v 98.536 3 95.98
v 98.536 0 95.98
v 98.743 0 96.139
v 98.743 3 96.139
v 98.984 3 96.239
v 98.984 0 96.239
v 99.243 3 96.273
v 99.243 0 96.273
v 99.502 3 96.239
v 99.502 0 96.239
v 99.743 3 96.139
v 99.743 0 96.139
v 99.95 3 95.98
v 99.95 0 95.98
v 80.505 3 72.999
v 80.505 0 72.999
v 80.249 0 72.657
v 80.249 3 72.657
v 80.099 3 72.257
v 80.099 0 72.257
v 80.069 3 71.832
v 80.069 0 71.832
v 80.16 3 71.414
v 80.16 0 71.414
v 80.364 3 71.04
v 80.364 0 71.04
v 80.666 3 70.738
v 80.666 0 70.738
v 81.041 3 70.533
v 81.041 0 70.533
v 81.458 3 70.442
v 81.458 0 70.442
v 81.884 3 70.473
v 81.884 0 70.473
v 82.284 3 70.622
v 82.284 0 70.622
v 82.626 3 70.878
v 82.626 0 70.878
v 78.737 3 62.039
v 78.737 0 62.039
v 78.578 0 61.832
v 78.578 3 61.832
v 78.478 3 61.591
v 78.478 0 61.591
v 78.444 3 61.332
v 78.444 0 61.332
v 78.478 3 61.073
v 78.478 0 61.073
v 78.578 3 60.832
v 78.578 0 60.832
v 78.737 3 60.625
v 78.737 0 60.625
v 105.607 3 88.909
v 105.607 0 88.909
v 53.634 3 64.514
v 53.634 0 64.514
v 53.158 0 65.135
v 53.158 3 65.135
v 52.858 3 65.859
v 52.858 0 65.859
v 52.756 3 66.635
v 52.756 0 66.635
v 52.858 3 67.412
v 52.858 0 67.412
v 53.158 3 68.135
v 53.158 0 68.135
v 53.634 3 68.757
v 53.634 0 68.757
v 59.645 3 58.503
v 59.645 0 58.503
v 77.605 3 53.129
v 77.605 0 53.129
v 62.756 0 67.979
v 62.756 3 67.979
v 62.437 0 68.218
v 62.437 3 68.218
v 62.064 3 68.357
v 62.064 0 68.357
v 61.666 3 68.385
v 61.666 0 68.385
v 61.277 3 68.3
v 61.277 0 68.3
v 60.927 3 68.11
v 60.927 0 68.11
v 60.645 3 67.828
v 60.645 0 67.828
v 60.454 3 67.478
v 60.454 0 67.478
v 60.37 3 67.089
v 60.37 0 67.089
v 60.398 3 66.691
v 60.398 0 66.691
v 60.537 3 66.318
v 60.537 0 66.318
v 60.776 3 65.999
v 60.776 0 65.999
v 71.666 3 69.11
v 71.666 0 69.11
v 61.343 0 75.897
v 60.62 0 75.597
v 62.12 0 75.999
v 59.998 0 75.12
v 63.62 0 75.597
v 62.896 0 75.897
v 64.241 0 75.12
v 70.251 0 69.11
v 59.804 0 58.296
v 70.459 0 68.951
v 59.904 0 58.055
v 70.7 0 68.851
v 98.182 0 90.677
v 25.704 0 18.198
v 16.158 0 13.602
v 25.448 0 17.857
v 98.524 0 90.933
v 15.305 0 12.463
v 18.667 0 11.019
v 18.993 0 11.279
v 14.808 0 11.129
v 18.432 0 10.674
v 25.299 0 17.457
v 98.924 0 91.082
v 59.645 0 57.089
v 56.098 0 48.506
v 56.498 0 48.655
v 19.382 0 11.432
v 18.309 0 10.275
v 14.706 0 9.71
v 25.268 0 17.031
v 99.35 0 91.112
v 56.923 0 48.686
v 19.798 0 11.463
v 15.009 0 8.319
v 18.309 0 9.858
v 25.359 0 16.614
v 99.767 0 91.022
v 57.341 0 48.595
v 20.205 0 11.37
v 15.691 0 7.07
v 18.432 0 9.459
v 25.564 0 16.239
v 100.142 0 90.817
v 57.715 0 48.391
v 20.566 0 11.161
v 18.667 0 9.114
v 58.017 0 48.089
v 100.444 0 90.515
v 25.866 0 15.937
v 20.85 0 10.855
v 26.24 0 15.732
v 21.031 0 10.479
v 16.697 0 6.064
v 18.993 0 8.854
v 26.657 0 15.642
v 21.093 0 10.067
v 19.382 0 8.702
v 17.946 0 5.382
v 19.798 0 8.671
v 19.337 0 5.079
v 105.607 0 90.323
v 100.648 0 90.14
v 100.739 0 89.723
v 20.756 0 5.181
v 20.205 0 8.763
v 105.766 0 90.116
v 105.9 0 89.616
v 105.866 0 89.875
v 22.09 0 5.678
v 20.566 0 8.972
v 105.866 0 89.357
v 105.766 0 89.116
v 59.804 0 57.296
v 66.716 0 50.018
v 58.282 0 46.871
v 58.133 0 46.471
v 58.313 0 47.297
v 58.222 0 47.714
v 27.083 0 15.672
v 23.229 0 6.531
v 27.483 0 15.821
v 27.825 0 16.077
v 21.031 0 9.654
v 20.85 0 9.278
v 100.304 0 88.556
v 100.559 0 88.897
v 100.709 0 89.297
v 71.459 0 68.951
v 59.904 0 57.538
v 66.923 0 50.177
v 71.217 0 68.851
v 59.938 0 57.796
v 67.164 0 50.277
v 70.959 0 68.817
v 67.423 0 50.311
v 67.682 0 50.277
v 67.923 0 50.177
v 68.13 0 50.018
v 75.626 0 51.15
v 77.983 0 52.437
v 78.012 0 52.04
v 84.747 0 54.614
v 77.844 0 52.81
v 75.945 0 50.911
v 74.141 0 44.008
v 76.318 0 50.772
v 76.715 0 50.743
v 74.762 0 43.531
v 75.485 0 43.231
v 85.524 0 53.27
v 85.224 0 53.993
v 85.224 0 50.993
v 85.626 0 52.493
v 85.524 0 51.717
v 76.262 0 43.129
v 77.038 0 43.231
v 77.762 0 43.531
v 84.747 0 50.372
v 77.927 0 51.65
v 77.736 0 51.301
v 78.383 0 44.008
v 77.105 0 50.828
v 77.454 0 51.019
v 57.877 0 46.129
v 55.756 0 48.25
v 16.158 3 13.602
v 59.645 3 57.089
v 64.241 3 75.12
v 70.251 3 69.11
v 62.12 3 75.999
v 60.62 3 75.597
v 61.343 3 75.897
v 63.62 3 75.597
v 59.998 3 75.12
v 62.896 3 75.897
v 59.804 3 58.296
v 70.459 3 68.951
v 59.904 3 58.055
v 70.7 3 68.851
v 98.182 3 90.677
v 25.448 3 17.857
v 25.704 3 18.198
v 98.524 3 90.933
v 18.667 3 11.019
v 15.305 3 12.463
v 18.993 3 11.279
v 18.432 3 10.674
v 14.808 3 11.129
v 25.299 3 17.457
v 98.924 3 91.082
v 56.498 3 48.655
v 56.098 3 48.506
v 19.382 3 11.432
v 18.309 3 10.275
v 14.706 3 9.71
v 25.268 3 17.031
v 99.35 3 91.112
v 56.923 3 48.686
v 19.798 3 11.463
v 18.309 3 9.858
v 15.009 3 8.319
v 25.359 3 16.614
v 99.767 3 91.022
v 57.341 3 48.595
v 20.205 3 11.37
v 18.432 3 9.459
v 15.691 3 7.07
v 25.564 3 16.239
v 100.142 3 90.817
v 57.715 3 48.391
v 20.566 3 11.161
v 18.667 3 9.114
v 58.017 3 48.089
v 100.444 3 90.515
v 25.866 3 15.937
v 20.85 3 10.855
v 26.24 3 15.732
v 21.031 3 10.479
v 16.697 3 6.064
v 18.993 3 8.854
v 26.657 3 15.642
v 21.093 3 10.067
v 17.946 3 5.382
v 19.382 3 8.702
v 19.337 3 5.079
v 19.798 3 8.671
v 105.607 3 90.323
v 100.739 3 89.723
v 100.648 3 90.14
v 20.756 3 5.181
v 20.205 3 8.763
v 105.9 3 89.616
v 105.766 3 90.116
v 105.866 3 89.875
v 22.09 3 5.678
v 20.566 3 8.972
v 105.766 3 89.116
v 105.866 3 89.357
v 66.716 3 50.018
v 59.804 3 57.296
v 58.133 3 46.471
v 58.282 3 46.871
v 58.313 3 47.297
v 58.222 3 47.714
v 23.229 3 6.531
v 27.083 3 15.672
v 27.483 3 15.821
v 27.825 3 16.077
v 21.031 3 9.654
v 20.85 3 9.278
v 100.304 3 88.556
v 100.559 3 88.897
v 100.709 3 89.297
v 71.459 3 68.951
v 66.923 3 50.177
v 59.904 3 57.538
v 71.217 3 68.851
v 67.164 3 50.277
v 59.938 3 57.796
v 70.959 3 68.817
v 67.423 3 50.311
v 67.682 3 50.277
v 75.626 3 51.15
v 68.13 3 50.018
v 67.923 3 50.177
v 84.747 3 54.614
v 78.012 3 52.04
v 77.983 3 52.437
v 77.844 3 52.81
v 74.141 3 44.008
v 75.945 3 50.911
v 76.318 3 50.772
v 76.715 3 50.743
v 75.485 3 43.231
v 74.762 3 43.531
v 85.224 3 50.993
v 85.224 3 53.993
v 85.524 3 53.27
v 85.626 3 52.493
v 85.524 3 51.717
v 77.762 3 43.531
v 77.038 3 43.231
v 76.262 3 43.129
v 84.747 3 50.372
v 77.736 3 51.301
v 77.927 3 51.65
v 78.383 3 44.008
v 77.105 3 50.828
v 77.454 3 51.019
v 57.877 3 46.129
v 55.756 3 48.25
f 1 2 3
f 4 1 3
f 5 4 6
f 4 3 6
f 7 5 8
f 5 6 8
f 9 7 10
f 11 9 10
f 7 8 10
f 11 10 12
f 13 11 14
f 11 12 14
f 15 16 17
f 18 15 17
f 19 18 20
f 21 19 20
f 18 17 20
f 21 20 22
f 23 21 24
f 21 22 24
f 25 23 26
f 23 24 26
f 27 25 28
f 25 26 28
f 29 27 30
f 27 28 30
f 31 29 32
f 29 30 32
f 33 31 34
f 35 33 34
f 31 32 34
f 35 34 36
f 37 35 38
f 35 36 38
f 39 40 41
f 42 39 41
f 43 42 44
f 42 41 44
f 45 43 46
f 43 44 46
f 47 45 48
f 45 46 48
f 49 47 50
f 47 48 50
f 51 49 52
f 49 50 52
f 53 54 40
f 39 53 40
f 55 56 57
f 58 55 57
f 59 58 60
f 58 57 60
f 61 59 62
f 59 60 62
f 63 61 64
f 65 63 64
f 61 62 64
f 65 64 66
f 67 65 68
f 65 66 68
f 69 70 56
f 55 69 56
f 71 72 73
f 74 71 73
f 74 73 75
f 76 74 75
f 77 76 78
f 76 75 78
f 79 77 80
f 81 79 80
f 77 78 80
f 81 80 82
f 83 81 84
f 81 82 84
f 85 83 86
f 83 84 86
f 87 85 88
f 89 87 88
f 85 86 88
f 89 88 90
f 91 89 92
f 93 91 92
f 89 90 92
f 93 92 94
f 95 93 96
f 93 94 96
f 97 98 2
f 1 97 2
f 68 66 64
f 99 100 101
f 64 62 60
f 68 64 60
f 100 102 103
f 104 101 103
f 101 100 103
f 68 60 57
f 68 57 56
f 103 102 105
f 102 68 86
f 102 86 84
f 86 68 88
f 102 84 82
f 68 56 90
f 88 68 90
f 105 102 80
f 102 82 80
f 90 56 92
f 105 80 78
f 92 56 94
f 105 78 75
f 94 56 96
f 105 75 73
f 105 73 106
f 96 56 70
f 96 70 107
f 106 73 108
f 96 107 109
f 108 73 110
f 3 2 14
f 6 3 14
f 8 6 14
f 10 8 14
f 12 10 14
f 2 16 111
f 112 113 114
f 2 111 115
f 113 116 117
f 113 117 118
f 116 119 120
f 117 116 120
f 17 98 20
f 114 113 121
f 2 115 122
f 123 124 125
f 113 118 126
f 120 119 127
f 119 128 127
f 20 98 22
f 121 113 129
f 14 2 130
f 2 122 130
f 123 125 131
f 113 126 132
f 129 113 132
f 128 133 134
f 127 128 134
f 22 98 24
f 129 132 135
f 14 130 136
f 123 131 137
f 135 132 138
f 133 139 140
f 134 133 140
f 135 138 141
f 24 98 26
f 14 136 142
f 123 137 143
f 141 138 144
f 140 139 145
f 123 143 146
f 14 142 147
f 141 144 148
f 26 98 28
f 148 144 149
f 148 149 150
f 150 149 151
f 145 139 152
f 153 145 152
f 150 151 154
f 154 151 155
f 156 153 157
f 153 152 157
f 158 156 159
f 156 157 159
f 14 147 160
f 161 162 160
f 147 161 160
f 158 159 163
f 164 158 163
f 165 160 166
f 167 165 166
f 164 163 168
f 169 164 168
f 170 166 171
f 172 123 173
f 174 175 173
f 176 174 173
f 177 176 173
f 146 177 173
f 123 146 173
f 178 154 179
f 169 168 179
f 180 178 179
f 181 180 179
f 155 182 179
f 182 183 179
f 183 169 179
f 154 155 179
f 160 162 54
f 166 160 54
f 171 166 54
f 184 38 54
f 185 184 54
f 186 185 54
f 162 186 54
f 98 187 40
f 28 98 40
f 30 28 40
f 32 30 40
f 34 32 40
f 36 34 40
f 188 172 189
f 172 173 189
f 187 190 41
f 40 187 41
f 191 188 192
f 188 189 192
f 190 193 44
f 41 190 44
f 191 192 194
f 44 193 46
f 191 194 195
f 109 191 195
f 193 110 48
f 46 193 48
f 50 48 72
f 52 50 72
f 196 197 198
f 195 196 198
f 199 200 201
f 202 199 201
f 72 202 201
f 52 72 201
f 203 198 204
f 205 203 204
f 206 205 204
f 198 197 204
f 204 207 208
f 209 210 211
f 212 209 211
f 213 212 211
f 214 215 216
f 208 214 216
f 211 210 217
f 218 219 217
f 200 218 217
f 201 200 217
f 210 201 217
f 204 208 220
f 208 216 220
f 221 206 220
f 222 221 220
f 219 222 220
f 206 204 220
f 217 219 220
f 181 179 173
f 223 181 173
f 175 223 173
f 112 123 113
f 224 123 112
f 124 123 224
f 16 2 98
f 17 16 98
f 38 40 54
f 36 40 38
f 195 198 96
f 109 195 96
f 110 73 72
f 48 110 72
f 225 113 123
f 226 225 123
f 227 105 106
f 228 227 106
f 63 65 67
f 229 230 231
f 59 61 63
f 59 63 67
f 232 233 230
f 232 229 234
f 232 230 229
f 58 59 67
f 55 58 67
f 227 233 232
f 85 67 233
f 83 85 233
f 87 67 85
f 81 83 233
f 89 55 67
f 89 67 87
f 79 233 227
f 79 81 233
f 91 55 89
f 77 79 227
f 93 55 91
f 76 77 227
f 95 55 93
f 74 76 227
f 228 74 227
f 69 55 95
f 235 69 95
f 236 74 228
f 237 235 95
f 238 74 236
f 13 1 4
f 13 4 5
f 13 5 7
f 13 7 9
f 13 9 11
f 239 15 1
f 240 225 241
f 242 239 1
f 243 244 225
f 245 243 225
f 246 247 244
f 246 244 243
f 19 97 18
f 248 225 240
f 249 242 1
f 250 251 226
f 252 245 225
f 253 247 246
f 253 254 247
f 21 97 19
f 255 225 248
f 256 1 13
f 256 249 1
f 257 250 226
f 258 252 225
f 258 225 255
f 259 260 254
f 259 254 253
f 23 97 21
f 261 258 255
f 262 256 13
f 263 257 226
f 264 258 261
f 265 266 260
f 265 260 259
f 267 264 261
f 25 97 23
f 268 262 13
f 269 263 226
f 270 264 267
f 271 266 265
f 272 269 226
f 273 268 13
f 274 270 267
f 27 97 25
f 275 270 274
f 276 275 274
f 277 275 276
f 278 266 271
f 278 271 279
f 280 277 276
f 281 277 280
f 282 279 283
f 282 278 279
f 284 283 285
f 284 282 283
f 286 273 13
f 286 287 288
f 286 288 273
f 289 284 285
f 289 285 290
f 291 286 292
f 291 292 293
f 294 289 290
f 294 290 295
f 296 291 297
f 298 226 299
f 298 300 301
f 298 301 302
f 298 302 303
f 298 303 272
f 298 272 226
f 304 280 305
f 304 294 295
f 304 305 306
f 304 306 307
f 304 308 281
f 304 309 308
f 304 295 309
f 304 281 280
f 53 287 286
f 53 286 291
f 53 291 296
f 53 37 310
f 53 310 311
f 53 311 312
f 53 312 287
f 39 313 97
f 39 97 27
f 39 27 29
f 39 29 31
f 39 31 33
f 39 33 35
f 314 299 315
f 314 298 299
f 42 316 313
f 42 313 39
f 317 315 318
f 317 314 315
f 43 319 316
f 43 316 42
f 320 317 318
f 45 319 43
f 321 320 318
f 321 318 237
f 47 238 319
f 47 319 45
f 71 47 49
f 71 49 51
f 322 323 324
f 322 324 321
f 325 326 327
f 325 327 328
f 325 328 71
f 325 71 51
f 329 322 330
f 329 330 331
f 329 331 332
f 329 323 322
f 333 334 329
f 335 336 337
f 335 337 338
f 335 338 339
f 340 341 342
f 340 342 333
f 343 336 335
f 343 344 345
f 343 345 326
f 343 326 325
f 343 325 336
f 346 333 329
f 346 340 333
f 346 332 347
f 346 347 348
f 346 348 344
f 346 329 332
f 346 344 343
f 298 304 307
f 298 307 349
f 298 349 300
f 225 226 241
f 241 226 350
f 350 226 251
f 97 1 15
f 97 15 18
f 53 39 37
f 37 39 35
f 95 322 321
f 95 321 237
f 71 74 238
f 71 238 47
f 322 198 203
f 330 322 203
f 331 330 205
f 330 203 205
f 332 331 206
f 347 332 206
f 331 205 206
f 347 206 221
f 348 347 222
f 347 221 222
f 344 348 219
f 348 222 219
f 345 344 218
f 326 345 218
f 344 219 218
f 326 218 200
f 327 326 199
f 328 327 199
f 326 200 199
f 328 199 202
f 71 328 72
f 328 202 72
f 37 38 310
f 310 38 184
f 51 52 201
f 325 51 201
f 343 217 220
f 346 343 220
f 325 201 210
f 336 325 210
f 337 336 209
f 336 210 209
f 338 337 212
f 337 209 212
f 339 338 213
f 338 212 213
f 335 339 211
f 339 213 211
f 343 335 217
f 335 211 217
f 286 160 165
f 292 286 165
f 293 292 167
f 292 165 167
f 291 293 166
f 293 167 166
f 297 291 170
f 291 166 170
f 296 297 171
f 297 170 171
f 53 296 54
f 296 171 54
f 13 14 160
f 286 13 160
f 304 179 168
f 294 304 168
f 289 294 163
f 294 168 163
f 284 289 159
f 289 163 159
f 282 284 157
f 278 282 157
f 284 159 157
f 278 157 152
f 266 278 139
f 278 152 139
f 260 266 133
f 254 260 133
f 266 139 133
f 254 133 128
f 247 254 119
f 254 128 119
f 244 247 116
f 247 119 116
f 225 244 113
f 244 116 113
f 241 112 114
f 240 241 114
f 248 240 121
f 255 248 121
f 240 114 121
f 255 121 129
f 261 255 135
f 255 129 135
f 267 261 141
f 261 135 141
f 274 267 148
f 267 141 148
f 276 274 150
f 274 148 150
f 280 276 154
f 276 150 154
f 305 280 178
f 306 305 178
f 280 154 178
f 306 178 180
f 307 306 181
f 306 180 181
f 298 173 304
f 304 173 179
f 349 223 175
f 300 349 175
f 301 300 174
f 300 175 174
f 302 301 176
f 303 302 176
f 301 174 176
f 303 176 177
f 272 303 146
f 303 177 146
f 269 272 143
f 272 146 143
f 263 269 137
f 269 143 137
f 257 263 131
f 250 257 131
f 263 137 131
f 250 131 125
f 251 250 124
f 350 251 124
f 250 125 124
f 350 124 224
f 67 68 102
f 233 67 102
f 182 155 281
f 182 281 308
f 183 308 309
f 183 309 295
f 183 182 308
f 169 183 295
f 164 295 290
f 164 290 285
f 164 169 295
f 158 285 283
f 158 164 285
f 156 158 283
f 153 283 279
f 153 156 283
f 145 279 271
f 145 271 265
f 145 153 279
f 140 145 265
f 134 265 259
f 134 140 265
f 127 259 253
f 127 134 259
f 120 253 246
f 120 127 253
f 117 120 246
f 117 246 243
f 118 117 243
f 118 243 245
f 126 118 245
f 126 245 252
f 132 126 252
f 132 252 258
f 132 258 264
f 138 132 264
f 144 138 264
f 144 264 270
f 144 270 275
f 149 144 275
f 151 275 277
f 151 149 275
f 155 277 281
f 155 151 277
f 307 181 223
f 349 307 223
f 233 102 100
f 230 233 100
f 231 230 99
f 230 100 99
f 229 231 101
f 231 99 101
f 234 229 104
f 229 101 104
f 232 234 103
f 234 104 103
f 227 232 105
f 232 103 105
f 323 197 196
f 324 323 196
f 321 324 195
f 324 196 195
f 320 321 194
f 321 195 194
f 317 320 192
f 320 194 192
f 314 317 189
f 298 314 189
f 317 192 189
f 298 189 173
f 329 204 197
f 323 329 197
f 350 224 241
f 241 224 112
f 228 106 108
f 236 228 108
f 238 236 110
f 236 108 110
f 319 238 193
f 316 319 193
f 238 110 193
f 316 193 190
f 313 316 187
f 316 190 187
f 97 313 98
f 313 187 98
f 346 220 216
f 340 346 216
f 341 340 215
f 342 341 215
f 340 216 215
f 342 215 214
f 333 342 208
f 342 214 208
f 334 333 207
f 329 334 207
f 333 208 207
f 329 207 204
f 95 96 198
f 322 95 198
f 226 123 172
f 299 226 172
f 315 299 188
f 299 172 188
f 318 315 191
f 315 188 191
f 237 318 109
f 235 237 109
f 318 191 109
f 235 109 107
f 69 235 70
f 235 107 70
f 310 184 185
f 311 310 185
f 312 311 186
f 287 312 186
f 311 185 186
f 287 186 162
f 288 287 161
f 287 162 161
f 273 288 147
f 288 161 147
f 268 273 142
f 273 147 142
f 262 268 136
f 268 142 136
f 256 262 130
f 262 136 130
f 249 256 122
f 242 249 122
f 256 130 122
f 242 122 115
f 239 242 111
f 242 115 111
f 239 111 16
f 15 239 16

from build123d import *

# Parameters (mm, degrees)
SKETCH1_R           = 1.4
BOSS_EXTRUDE1_DEPTH = 3


with BuildPart() as part:
    # Sketch1 → Boss-Extrude1 (new body)
    with BuildSketch(Plane(origin=(0, 0, 0), x_dir=(1, 0, 0), z_dir=(0, 1, 0))):
        with BuildLine():
            Line((66.715956662, -50.018199395), (23.228889619, -6.531132352))
            ThreePointArc((23.228889619, -6.531132352), (16.157821807, -6.531132352), (16.157821807, -13.602200164))
            Line((16.157821807, -13.602200164), (59.64488885, -57.089267207))
            ThreePointArc((59.64488885, -57.089267207), (59.937782069, -57.796373988), (59.64488885, -58.503480769))
            Line((59.64488885, -58.503480769), (53.63448121, -64.513888409))
            ThreePointArc((53.63448121, -64.513888409), (52.755801554, -66.635208753), (53.63448121, -68.756529097))
            Line((53.63448121, -68.756529097), (59.998442241, -75.120490127))
            ThreePointArc((59.998442241, -75.120490127), (62.119762584, -75.999169784), (64.241082928, -75.120490127))
            Line((64.241082928, -75.120490127), (70.251490568, -69.110082487))
            ThreePointArc((70.251490568, -69.110082487), (70.958597349, -68.817189268), (71.665704131, -69.110082487))
            Line((71.665704131, -69.110082487), (98.535761816, -95.980140172))
            ThreePointArc((98.535761816, -95.980140172), (99.242868597, -96.273033391), (99.949975378, -95.980140172))
            Line((99.949975378, -95.980140172), (105.606829627, -90.323285923))
            ThreePointArc((105.606829627, -90.323285923), (105.899722846, -89.616179142), (105.606829627, -88.90907236))
            Line((105.606829627, -88.90907236), (78.736771942, -62.039014675))
            ThreePointArc((78.736771942, -62.039014675), (78.443878724, -61.331907894), (78.736771942, -60.624801113))
            Line((78.736771942, -60.624801113), (84.747179582, -54.614393473))
            ThreePointArc((84.747179582, -54.614393473), (85.625859239, -52.493073129), (84.747179582, -50.371752786))
            Line((84.747179582, -50.371752786), (78.383218552, -44.007791755))
            ThreePointArc((78.383218552, -44.007791755), (76.261898208, -43.129112099), (74.140577865, -44.007791755))
            Line((74.140577865, -44.007791755), (68.130170225, -50.018199395))
            ThreePointArc((68.130170225, -50.018199395), (67.423063443, -50.311092614), (66.715956662, -50.018199395))
        make_face()
        with Locations((19.693355713, -10.066666258)):
            Circle(SKETCH1_R, mode=Mode.SUBTRACT)
        with BuildLine():
            Line((82.625859239, -70.87784944), (100.303528769, -88.55551897))
            ThreePointArc((100.303528769, -88.55551897), (100.303528769, -90.676839313), (98.182208425, -90.676839313))
            Line((98.182208425, -90.676839313), (80.504538895, -72.999169784))
            ThreePointArc((80.504538895, -72.999169784), (80.504538895, -70.87784944), (82.625859239, -70.87784944))
        make_face(mode=Mode.SUBTRACT)
        with BuildLine():
            Line((60.7762597, -65.99881265), (75.625502105, -51.149570245))
            ThreePointArc((75.625502105, -51.149570245), (77.605401092, -51.149570245), (77.605401092, -53.129469232))
            Line((77.605401092, -53.129469232), (62.756158688, -67.978711637))
            ThreePointArc((62.756158688, -67.978711637), (60.7762597, -67.978711637), (60.7762597, -65.99881265))
        make_face(mode=Mode.SUBTRACT)
        with BuildLine():
            Line((27.825083697, -16.077073898), (57.877121897, -46.129112099))
            ThreePointArc((57.877121897, -46.129112099), (57.877121897, -48.250432442), (55.755801554, -48.250432442))
            Line((55.755801554, -48.250432442), (25.703763353, -18.198394242))
            ThreePointArc((25.703763353, -18.198394242), (25.703763353, -16.077073898), (27.825083697, -16.077073898))
        make_face(mode=Mode.SUBTRACT)
    extrude(amount=BOSS_EXTRUDE1_DEPTH)


solid = part.part
